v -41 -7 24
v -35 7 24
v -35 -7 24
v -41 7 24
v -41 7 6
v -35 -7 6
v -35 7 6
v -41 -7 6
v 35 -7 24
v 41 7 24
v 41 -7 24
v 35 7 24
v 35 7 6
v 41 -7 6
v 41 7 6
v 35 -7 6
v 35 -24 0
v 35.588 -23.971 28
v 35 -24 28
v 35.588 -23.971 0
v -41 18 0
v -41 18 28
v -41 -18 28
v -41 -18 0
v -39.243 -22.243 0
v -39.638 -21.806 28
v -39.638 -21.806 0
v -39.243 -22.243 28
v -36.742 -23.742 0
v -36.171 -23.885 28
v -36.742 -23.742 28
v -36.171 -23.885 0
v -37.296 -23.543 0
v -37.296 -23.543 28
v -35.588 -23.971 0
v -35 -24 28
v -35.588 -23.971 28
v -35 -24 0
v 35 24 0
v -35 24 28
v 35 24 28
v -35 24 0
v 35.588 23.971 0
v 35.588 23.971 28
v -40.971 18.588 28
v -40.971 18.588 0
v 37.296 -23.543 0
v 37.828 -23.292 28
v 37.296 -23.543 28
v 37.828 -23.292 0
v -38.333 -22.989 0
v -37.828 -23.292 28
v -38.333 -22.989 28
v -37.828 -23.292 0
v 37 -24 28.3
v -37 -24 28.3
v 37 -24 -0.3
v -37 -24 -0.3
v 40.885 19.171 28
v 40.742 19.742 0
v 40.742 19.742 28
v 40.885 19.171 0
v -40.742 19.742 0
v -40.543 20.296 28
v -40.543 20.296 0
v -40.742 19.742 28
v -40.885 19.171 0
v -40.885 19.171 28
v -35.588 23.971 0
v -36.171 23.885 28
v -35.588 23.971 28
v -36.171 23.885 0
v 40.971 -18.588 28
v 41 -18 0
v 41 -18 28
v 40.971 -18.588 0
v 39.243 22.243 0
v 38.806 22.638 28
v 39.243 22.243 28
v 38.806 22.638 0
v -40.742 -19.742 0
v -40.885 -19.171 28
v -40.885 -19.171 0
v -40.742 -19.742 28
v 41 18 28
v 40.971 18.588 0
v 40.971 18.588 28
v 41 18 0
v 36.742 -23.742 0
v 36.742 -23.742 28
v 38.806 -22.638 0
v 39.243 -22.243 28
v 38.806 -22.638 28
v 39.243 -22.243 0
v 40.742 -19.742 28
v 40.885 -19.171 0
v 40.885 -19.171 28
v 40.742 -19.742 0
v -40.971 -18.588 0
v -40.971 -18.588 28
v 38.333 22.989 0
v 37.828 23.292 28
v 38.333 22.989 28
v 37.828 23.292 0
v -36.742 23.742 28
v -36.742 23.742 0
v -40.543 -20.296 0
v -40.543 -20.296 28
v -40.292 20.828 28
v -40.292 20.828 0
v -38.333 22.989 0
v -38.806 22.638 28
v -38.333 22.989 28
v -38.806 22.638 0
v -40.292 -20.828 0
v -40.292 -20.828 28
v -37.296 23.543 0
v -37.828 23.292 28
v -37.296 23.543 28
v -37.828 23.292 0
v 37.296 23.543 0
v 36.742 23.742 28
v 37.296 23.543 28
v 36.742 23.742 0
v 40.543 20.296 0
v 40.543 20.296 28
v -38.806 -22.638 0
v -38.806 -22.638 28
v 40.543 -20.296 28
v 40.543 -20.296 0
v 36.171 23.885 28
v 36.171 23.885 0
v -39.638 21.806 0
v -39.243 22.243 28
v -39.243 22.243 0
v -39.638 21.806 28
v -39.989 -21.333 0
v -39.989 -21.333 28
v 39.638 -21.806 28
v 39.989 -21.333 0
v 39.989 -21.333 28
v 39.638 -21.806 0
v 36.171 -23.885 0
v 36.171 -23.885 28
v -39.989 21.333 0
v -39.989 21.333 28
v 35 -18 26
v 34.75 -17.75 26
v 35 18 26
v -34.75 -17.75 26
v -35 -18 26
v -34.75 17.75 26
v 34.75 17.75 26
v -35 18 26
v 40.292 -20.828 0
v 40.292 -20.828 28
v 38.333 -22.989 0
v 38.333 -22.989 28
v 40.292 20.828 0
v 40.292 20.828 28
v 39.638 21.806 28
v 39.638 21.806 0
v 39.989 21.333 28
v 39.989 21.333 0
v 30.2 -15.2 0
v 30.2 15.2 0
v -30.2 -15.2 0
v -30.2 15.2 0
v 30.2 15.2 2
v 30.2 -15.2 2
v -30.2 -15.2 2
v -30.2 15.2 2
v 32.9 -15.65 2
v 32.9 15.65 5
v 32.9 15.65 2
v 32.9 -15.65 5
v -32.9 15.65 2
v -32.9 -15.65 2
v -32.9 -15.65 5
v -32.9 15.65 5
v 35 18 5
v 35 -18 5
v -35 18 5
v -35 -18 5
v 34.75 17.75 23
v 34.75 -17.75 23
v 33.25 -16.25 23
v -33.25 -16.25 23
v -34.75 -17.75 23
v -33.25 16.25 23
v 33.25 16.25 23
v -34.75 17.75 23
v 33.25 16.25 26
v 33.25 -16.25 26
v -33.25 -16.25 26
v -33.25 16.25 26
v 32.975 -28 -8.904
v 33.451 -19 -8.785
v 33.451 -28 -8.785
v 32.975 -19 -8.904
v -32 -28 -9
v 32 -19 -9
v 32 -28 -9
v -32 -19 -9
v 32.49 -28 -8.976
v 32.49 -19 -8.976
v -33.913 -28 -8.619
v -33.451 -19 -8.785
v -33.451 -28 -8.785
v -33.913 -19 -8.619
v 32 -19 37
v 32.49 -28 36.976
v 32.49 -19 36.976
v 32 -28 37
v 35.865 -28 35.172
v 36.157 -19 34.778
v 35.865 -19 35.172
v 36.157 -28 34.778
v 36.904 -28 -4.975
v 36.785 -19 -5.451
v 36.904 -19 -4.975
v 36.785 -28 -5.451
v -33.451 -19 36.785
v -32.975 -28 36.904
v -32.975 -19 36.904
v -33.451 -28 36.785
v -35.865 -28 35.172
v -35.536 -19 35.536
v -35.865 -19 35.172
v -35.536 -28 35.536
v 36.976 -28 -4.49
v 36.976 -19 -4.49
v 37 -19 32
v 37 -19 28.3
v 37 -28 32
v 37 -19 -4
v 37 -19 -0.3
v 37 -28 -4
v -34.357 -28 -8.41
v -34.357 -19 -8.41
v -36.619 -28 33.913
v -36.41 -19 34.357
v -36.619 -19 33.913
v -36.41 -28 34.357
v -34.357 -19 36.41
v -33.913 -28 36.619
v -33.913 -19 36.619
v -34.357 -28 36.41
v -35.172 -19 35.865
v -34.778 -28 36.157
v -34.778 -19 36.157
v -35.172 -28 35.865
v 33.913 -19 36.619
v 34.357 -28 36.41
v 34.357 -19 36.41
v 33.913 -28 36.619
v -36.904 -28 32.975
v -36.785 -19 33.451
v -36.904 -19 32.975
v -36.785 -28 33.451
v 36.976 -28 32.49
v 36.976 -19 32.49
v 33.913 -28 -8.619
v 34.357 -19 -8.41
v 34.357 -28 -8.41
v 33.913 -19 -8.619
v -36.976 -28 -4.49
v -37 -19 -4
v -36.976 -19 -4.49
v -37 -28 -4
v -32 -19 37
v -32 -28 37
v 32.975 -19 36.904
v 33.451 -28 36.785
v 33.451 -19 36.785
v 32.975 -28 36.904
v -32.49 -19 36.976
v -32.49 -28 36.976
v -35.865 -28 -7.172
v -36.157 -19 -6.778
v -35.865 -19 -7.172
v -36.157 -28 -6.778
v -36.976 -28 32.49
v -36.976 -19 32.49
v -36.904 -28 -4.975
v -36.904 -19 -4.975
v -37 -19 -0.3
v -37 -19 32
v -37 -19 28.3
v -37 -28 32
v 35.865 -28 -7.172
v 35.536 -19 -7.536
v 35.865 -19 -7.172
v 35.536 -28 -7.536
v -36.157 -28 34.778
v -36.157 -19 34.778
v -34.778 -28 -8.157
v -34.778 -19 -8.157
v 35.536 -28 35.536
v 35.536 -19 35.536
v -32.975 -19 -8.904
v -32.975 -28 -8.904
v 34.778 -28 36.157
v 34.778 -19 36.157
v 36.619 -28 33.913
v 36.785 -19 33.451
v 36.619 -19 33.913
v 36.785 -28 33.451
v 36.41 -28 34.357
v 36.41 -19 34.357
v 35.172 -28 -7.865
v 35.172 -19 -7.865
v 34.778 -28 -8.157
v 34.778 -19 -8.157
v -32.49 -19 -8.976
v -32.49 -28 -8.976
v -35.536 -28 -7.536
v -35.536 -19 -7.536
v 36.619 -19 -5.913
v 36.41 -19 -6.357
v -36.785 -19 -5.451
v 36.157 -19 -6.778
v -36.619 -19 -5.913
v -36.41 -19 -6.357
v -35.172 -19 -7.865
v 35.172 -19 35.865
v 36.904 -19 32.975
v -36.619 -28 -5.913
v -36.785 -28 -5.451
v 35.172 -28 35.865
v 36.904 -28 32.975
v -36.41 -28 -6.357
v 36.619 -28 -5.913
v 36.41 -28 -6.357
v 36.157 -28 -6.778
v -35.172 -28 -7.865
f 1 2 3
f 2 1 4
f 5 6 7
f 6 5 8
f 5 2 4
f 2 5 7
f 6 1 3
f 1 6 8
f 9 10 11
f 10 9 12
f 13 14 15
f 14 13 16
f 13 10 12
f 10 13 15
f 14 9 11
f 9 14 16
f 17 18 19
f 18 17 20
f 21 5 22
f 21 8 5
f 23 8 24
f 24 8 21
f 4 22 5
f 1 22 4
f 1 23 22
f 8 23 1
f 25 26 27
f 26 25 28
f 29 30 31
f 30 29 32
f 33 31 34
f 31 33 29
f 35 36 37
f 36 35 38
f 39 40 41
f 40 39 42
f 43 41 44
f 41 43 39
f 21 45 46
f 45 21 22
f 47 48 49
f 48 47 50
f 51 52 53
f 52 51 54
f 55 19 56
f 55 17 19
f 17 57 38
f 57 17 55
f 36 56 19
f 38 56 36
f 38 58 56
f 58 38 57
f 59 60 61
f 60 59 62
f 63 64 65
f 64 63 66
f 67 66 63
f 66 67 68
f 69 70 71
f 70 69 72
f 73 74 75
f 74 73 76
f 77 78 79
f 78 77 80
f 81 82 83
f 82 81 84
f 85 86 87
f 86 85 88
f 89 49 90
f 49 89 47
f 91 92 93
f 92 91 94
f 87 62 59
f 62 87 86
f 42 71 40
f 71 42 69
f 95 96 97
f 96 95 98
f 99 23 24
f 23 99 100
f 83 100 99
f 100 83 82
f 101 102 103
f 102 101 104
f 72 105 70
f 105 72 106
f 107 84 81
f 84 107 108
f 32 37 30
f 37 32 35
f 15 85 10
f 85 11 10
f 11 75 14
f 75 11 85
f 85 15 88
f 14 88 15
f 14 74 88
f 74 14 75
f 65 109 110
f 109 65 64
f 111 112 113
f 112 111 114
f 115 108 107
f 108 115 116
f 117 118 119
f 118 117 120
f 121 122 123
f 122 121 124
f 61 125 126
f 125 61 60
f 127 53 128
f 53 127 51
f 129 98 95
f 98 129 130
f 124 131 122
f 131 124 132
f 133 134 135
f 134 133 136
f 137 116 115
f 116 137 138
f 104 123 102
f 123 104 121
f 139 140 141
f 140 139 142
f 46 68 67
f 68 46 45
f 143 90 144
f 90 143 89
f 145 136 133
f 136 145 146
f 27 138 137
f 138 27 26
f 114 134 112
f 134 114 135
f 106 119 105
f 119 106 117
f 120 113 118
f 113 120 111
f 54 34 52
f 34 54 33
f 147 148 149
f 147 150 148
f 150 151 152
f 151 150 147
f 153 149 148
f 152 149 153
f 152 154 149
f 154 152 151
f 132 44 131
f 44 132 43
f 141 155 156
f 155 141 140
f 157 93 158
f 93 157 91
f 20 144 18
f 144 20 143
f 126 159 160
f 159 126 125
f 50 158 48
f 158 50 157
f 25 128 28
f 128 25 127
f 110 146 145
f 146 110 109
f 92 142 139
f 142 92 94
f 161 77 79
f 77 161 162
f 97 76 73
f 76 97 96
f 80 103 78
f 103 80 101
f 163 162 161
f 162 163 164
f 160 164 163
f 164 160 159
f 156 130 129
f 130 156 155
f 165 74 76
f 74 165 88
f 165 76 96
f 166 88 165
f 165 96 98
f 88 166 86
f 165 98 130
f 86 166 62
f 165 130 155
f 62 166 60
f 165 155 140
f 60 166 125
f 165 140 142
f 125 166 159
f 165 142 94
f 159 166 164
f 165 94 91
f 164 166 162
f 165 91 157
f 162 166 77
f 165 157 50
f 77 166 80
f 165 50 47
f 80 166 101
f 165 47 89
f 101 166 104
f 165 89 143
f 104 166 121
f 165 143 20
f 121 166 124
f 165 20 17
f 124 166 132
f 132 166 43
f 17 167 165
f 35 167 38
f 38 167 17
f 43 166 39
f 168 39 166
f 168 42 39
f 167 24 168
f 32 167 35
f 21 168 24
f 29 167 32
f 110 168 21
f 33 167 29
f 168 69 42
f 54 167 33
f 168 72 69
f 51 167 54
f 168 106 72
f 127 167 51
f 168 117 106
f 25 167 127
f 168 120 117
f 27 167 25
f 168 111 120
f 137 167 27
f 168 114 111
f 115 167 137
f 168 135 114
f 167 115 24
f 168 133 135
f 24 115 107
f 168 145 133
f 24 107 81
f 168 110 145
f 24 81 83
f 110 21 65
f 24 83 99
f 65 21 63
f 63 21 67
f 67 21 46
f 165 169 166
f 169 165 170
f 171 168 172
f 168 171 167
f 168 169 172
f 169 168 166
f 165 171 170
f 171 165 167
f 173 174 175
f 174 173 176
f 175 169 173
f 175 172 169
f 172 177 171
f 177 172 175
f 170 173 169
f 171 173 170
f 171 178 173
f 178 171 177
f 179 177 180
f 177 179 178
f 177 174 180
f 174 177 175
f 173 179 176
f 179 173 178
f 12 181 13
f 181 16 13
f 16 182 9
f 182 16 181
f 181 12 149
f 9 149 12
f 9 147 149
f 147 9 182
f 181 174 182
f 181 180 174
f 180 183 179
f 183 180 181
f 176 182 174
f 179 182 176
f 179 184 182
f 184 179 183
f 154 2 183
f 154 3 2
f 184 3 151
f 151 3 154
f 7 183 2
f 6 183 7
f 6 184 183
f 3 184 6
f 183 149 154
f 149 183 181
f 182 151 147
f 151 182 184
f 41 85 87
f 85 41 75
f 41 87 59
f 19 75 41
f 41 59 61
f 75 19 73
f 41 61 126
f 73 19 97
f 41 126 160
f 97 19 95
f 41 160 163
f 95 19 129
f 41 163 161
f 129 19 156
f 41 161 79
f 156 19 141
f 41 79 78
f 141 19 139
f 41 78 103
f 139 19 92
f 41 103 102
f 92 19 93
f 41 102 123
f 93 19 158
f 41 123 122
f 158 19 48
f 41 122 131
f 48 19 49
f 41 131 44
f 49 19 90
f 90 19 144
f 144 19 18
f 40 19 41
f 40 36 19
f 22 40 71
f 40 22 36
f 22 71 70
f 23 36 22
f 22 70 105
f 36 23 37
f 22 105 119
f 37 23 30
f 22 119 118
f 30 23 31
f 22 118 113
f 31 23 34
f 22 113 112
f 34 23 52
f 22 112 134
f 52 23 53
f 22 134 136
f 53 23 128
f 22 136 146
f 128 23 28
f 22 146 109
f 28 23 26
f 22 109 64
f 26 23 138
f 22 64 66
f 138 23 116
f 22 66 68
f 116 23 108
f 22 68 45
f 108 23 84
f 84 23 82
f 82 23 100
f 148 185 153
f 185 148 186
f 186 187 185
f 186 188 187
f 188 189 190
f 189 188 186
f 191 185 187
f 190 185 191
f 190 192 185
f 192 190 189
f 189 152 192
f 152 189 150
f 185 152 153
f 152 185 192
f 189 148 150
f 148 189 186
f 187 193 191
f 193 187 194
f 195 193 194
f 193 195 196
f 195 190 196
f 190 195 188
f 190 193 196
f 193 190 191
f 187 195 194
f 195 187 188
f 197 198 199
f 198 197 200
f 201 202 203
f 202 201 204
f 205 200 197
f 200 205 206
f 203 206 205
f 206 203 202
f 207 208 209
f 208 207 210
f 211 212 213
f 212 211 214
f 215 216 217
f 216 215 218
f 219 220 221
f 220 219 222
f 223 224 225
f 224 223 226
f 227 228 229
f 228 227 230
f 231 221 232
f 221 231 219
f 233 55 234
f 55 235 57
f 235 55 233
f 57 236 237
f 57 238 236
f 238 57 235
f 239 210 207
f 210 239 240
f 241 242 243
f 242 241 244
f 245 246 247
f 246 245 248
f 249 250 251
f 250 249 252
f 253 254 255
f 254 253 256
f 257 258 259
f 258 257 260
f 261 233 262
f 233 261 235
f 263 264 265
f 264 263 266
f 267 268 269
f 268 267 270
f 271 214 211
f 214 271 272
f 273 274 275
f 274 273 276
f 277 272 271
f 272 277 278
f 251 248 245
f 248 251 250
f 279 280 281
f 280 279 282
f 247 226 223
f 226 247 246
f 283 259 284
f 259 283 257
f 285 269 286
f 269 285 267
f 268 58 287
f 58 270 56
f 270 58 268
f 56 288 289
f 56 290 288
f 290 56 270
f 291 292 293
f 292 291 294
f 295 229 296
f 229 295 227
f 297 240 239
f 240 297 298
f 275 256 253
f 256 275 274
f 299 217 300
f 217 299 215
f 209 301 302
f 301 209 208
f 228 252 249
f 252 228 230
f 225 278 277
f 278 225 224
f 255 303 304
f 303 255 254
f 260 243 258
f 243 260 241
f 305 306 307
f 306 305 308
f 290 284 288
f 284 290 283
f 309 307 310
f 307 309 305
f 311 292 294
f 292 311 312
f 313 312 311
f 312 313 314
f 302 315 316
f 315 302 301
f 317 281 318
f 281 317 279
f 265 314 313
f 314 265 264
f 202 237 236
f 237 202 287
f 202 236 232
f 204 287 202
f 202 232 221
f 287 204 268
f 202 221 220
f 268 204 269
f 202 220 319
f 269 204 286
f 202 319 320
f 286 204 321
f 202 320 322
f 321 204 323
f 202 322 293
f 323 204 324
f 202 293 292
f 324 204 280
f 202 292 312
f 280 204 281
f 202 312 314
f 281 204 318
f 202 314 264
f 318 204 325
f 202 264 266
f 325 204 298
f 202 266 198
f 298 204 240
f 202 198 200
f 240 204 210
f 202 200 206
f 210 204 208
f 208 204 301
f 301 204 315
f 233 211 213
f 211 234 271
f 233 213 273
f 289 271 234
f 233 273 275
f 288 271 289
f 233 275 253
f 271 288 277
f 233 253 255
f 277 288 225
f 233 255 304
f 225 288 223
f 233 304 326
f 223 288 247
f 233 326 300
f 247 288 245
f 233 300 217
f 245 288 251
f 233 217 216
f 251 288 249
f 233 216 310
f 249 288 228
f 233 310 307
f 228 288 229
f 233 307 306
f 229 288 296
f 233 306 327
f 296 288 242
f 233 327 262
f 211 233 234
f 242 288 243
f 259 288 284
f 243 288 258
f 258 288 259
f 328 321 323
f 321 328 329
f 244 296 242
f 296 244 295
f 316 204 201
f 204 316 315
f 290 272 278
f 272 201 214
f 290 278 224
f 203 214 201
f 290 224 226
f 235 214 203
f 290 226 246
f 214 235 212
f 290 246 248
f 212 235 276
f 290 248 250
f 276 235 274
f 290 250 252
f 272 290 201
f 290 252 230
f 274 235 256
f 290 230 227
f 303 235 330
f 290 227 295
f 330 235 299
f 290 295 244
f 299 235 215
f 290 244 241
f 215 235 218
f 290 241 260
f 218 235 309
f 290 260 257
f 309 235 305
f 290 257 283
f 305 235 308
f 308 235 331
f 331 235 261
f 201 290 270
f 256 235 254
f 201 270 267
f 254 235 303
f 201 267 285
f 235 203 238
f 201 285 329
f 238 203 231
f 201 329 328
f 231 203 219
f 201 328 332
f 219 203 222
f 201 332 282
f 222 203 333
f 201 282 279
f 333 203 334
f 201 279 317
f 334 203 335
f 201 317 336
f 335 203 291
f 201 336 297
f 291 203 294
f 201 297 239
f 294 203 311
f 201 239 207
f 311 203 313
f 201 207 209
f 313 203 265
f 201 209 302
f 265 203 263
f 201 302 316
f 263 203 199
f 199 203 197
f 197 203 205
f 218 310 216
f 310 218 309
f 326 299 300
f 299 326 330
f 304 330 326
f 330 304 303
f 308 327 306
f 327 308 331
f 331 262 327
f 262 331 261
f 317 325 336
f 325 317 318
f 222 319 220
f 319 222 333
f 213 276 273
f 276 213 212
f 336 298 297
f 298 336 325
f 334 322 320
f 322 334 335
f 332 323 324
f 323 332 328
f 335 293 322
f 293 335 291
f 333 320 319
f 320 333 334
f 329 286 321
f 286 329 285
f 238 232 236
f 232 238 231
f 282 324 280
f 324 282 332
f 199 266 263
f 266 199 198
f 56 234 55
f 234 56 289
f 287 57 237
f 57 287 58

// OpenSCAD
// PicoMado Soft Frame. Millimetres. Physical fit unverified.
part="assembly"; // body, lid, stand, assembly, layout
$fn=64;
pcb_w=65; pcb_h=30.5; pcb_clearance=.4;
window_w=60.4; window_h=30.4; window_x=0; window_y=0;
lid_clearance=.25;
module rect(w,h,z,d){translate([-w/2,-h/2,z])cube([w,h,d]);}
module rounded(w,h,r,z,d){translate([0,0,z])linear_extrude(d)offset(r=r)square([w-2*r,h-2*r],center=true);}
module body(){difference(){
 rounded(82,48,6,0,26);
 translate([window_x,window_y,0])rect(window_w,window_h,-1,4);
 rect(pcb_w+2*pcb_clearance,pcb_h+2*pcb_clearance,2,4);
 rect(70,36,5,28);
 for(s=[-1,1])translate([s*39,0,0])rect(12,14,6,18);
}}
module lid(){difference(){union(){
 rounded(82,48,6,0,2);
 rect(70-2*lid_clearance,36-2*lid_clearance,2,3);
}rect(67-2*lid_clearance,33-2*lid_clearance,2,4);}}
// Broad separate cradle; 28.6 mm slot for 28 mm assembled case.
module cradle(){difference(){rounded(74,46,5,0,9);rect(84,28.6,4,8);}}
module assembly(){
 color([.89,.85,.74])body();
 color([.28,.40,.35])translate([0,0,28])mirror([0,0,1])lid();
 color([.28,.40,.35])multmatrix([[1,0,0,0],[0,0,1,-28],[0,1,0,14],[0,0,0,1]])cradle();
}
if(part=="body")body();
if(part=="lid")lid();
if(part=="stand")cradle();
if(part=="assembly")assembly();
if(part=="layout"){body();translate([0,58,0])lid();translate([92,0,0])cradle();}
